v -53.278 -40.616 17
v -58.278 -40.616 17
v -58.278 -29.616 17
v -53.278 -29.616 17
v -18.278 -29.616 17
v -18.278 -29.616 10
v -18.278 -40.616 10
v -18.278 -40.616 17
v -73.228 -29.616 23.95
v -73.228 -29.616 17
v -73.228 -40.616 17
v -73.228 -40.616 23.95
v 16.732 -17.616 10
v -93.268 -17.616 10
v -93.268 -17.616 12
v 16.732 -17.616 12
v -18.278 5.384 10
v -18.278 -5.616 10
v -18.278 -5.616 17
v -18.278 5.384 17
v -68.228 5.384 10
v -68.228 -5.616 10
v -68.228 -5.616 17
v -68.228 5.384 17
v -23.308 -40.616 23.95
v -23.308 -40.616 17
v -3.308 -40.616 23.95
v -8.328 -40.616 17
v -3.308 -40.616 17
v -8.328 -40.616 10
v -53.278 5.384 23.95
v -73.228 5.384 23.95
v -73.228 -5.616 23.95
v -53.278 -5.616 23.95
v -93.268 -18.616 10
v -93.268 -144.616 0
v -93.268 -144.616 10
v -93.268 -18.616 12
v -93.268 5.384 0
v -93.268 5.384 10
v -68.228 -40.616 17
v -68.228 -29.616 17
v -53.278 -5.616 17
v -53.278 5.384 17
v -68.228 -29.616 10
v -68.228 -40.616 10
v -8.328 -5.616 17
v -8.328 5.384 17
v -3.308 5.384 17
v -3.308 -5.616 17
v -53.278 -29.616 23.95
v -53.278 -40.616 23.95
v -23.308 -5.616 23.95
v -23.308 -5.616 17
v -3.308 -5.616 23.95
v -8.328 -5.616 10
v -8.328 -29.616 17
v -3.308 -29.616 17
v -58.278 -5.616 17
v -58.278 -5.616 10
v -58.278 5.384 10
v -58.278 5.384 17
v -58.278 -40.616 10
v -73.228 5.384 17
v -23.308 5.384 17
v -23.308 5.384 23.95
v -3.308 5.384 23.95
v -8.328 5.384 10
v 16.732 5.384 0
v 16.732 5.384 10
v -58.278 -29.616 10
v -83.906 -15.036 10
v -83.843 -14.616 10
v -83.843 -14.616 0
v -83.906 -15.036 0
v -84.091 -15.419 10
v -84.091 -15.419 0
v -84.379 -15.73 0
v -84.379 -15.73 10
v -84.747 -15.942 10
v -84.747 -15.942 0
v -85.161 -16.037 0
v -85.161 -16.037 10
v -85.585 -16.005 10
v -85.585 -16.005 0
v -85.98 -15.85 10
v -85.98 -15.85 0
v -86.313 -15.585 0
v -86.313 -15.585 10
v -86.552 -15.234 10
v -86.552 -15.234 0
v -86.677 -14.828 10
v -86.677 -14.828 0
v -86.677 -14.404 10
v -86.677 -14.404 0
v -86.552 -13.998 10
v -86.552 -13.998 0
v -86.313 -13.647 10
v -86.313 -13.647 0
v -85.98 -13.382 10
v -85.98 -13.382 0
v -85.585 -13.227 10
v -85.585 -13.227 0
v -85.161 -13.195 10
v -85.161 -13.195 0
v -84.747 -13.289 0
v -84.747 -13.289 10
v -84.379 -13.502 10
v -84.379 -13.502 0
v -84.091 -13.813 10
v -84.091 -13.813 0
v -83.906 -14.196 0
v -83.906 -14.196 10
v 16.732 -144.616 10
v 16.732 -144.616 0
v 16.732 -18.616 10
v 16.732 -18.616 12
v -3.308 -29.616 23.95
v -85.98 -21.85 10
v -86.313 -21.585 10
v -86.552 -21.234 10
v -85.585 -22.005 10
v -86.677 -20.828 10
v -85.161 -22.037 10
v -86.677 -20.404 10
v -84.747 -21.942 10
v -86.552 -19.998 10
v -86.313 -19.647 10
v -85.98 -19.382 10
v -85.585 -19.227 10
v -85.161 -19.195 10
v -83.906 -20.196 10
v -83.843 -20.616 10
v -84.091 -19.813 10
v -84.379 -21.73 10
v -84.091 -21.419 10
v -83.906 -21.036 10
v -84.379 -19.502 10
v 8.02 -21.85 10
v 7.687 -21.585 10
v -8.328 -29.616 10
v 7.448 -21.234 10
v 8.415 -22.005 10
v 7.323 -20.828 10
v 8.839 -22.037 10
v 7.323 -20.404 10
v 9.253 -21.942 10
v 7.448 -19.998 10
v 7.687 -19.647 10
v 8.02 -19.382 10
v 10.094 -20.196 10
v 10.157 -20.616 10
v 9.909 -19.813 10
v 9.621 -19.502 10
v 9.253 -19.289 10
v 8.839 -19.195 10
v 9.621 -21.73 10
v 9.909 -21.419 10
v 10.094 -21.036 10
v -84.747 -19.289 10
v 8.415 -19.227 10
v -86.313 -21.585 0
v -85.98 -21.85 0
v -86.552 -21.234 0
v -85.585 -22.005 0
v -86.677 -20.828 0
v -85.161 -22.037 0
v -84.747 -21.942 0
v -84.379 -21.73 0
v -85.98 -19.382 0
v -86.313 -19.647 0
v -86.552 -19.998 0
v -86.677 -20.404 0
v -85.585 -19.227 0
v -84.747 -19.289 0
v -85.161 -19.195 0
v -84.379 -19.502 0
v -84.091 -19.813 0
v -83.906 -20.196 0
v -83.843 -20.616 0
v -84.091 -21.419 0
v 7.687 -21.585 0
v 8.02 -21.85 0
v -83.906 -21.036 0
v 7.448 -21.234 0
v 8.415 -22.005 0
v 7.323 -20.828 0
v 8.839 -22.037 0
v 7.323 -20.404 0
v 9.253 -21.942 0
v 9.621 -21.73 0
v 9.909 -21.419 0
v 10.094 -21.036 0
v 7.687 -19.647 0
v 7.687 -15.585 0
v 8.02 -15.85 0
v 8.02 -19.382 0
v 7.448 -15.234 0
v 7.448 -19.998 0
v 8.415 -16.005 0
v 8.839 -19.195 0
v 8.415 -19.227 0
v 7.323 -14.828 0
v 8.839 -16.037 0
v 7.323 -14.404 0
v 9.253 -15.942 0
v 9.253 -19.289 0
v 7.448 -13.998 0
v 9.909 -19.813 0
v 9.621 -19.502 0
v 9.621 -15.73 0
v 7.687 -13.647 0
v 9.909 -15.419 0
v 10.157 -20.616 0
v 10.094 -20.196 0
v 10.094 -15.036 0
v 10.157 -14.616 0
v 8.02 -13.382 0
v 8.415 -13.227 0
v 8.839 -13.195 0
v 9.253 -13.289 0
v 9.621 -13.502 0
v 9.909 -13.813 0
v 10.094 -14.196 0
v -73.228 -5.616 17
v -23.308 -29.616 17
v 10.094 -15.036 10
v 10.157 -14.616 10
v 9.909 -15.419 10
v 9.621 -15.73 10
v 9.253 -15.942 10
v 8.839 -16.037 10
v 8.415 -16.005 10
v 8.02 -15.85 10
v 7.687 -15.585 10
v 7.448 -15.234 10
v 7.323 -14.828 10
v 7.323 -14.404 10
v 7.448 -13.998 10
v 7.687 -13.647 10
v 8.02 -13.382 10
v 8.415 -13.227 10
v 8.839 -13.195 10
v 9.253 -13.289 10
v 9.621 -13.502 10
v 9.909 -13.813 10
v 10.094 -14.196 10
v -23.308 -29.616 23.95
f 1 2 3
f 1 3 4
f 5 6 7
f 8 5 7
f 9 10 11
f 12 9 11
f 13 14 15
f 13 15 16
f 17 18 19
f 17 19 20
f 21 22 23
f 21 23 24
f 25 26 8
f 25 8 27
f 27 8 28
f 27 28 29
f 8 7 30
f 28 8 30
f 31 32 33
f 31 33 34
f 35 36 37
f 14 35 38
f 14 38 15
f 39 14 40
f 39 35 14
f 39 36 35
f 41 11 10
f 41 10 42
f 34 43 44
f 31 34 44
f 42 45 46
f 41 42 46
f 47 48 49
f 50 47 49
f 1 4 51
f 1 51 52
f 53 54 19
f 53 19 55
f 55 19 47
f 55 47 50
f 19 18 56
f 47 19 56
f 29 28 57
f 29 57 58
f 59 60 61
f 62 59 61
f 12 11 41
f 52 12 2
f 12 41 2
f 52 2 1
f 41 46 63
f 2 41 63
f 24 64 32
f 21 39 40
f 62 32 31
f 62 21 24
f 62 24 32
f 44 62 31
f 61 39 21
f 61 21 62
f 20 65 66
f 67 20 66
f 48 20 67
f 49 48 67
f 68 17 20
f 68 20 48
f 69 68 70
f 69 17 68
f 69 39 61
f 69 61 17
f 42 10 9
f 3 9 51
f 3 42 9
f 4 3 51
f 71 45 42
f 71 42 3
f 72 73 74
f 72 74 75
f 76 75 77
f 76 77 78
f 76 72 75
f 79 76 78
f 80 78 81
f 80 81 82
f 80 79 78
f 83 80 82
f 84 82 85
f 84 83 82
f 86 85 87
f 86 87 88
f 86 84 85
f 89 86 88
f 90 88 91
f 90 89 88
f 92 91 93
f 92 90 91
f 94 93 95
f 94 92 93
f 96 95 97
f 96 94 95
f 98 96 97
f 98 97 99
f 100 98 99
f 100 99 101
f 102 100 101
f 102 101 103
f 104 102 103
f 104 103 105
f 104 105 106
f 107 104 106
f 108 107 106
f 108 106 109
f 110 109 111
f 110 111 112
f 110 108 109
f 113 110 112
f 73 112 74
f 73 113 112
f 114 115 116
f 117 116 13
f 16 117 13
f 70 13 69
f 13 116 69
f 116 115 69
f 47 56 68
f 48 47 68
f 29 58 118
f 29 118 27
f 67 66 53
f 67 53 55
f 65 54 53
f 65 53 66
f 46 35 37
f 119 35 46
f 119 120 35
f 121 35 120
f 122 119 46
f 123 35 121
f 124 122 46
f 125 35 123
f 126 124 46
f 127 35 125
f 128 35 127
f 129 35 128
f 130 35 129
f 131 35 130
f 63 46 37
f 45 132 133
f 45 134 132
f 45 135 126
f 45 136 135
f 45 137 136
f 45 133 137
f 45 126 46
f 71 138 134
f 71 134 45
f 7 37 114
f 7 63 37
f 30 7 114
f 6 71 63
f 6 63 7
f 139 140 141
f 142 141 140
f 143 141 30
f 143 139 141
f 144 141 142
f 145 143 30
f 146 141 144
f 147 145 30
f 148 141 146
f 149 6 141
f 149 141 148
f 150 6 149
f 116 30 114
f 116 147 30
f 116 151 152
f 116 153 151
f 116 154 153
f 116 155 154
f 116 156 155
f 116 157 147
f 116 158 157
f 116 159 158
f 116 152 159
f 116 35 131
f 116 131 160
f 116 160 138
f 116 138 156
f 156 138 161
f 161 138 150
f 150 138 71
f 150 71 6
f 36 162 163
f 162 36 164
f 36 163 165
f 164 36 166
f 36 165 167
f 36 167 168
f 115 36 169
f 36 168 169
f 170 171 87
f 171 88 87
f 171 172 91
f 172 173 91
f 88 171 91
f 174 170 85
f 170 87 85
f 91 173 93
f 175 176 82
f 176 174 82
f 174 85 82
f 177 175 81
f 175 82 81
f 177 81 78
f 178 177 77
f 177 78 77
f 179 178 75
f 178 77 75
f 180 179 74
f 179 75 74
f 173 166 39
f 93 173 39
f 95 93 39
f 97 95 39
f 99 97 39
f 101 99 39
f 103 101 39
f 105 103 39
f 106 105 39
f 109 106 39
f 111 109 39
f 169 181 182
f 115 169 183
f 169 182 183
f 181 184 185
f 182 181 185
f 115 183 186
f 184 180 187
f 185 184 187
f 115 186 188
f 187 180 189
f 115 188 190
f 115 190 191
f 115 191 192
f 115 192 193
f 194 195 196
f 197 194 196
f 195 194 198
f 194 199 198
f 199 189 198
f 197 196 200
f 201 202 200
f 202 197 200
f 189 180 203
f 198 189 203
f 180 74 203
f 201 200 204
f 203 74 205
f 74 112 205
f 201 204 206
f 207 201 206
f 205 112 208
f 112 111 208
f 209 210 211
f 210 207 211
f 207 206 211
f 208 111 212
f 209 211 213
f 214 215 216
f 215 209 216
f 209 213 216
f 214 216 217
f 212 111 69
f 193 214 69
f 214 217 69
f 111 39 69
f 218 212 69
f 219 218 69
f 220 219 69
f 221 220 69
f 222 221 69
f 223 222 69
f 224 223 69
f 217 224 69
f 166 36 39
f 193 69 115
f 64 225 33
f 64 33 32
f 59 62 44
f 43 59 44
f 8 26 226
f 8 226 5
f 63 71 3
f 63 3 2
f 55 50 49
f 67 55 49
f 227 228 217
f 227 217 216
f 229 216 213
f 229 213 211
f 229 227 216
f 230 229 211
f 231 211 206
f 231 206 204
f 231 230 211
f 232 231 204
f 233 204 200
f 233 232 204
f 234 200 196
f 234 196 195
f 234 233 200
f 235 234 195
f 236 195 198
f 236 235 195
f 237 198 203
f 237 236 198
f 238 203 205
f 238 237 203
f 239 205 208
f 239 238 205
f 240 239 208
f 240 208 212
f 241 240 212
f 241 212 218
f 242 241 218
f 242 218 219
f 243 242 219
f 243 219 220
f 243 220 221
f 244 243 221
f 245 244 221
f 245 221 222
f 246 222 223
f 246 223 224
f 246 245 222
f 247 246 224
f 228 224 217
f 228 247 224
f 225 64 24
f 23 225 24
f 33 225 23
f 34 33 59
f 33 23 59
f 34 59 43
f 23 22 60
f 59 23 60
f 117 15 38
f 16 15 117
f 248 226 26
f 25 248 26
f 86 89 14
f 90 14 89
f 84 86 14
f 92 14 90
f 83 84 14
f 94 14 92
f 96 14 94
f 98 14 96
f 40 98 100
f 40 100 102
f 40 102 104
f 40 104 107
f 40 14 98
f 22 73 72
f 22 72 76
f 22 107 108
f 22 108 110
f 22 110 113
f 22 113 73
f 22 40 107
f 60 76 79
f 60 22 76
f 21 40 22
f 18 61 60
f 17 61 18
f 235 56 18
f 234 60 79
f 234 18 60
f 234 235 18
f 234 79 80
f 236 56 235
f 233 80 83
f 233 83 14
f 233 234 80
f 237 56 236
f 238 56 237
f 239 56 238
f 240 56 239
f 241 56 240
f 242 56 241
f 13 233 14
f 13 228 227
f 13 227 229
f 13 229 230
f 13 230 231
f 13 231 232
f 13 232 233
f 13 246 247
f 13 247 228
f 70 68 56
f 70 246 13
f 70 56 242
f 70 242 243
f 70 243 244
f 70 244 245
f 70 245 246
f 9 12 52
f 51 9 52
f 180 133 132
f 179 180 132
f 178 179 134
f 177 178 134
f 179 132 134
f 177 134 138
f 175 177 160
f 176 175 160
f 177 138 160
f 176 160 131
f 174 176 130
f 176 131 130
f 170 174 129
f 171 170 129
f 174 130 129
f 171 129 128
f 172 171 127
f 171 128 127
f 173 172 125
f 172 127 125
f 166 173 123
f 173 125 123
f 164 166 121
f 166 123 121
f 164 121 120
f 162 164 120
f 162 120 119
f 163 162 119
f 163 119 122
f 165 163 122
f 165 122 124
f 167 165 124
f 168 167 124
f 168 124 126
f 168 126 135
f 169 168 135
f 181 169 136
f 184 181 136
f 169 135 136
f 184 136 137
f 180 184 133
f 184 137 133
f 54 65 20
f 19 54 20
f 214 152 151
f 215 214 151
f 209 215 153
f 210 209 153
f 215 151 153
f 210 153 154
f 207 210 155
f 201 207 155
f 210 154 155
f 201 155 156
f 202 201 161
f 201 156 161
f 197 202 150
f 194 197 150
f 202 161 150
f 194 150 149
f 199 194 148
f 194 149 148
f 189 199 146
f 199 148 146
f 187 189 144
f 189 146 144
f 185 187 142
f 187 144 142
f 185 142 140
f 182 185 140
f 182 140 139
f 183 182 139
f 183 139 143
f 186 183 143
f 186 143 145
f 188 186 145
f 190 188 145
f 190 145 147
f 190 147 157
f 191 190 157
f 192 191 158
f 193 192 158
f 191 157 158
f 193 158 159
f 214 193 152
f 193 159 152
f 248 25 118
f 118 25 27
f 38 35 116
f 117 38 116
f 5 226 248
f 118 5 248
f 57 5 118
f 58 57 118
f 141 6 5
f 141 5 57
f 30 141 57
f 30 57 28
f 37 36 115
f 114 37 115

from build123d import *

# Parameters (mm, degrees)
SKETCH1_W           = 110
SKETCH1_H           = 150
BOSS_EXTRUDE1_DEPTH = 10
SKETCH2_W           = 9.95
SKETCH2_H           = 11
BOSS_EXTRUDE2_DEPTH = 7
SKETCH3_W           = 19.95
SKETCH3_H           = 11
SKETCH3_W_2         = 20
BOSS_EXTRUDE3_DEPTH = 6.95
SKETCH6_R           = 1.425
CUT_EXTRUDE1_DEPTH  = 10
SKETCH7_W           = 110
SKETCH7_H           = 1
BOSS_EXTRUDE4_DEPTH = 2


with BuildPart() as part:
    # Sketch1 → Boss-Extrude1 (new body)
    with BuildSketch(Plane.XY):
        with Locations((-38.267930395, -69.615981522)):
            Rectangle(SKETCH1_W, SKETCH1_H)
    extrude(amount=BOSS_EXTRUDE1_DEPTH)

    # Sketch2 → Boss-Extrude2 (add)
    with BuildSketch(Plane.XY.offset(10)):
        with Locations((-63.252930395, -0.115981522)):
            Rectangle(SKETCH2_W, SKETCH2_H)
        with Locations((-13.302930395, -0.115981522)):
            Rectangle(SKETCH2_W, SKETCH2_H)
    boss_extrude2 = extrude(amount=BOSS_EXTRUDE2_DEPTH)

    # Sketch3 → Boss-Extrude3 (add)
    with BuildSketch(Plane.XY.offset(17)):
        with Locations((-63.252930395, -0.115981522)):
            Rectangle(SKETCH3_W, SKETCH3_H)
        with Locations((-13.307930395, -0.115981522)):
            Rectangle(SKETCH3_W_2, SKETCH3_H)
    boss_extrude3 = extrude(amount=BOSS_EXTRUDE3_DEPTH)

    # Sketch6 → Cut-Extrude1 (cut)
    with BuildSketch(Plane.XY.offset(10)):
        with Locations((-85.267930395, -20.615981522)):
            Circle(SKETCH6_R)
        with Locations((8.732069605, -20.615981522)):
            Circle(SKETCH6_R)
    cut_extrude1 = extrude(amount=-CUT_EXTRUDE1_DEPTH, mode=Mode.SUBTRACT)

    # Sketch7 → Boss-Extrude4 (add)
    with BuildSketch(Plane.XY.offset(10)):
        with Locations((-38.267930395, -18.115981522)):
            Rectangle(SKETCH7_W, SKETCH7_H)
    extrude(amount=BOSS_EXTRUDE4_DEPTH)

    # Mirror1: Boss-Extrude2, Boss-Extrude3, Cut-Extrude1 across plane
    add(boss_extrude2.mirror(Plane(origin=(16.732069605, -17.615981522, 12), x_dir=(0, 0, 1), z_dir=(0, -1, 0))))
    add(boss_extrude3.mirror(Plane(origin=(16.732069605, -17.615981522, 12), x_dir=(0, 0, 1), z_dir=(0, -1, 0))))
    add(cut_extrude1.mirror(Plane(origin=(16.732069605, -17.615981522, 12), x_dir=(0, 0, 1), z_dir=(0, -1, 0))), mode=Mode.SUBTRACT)


solid = part.part
